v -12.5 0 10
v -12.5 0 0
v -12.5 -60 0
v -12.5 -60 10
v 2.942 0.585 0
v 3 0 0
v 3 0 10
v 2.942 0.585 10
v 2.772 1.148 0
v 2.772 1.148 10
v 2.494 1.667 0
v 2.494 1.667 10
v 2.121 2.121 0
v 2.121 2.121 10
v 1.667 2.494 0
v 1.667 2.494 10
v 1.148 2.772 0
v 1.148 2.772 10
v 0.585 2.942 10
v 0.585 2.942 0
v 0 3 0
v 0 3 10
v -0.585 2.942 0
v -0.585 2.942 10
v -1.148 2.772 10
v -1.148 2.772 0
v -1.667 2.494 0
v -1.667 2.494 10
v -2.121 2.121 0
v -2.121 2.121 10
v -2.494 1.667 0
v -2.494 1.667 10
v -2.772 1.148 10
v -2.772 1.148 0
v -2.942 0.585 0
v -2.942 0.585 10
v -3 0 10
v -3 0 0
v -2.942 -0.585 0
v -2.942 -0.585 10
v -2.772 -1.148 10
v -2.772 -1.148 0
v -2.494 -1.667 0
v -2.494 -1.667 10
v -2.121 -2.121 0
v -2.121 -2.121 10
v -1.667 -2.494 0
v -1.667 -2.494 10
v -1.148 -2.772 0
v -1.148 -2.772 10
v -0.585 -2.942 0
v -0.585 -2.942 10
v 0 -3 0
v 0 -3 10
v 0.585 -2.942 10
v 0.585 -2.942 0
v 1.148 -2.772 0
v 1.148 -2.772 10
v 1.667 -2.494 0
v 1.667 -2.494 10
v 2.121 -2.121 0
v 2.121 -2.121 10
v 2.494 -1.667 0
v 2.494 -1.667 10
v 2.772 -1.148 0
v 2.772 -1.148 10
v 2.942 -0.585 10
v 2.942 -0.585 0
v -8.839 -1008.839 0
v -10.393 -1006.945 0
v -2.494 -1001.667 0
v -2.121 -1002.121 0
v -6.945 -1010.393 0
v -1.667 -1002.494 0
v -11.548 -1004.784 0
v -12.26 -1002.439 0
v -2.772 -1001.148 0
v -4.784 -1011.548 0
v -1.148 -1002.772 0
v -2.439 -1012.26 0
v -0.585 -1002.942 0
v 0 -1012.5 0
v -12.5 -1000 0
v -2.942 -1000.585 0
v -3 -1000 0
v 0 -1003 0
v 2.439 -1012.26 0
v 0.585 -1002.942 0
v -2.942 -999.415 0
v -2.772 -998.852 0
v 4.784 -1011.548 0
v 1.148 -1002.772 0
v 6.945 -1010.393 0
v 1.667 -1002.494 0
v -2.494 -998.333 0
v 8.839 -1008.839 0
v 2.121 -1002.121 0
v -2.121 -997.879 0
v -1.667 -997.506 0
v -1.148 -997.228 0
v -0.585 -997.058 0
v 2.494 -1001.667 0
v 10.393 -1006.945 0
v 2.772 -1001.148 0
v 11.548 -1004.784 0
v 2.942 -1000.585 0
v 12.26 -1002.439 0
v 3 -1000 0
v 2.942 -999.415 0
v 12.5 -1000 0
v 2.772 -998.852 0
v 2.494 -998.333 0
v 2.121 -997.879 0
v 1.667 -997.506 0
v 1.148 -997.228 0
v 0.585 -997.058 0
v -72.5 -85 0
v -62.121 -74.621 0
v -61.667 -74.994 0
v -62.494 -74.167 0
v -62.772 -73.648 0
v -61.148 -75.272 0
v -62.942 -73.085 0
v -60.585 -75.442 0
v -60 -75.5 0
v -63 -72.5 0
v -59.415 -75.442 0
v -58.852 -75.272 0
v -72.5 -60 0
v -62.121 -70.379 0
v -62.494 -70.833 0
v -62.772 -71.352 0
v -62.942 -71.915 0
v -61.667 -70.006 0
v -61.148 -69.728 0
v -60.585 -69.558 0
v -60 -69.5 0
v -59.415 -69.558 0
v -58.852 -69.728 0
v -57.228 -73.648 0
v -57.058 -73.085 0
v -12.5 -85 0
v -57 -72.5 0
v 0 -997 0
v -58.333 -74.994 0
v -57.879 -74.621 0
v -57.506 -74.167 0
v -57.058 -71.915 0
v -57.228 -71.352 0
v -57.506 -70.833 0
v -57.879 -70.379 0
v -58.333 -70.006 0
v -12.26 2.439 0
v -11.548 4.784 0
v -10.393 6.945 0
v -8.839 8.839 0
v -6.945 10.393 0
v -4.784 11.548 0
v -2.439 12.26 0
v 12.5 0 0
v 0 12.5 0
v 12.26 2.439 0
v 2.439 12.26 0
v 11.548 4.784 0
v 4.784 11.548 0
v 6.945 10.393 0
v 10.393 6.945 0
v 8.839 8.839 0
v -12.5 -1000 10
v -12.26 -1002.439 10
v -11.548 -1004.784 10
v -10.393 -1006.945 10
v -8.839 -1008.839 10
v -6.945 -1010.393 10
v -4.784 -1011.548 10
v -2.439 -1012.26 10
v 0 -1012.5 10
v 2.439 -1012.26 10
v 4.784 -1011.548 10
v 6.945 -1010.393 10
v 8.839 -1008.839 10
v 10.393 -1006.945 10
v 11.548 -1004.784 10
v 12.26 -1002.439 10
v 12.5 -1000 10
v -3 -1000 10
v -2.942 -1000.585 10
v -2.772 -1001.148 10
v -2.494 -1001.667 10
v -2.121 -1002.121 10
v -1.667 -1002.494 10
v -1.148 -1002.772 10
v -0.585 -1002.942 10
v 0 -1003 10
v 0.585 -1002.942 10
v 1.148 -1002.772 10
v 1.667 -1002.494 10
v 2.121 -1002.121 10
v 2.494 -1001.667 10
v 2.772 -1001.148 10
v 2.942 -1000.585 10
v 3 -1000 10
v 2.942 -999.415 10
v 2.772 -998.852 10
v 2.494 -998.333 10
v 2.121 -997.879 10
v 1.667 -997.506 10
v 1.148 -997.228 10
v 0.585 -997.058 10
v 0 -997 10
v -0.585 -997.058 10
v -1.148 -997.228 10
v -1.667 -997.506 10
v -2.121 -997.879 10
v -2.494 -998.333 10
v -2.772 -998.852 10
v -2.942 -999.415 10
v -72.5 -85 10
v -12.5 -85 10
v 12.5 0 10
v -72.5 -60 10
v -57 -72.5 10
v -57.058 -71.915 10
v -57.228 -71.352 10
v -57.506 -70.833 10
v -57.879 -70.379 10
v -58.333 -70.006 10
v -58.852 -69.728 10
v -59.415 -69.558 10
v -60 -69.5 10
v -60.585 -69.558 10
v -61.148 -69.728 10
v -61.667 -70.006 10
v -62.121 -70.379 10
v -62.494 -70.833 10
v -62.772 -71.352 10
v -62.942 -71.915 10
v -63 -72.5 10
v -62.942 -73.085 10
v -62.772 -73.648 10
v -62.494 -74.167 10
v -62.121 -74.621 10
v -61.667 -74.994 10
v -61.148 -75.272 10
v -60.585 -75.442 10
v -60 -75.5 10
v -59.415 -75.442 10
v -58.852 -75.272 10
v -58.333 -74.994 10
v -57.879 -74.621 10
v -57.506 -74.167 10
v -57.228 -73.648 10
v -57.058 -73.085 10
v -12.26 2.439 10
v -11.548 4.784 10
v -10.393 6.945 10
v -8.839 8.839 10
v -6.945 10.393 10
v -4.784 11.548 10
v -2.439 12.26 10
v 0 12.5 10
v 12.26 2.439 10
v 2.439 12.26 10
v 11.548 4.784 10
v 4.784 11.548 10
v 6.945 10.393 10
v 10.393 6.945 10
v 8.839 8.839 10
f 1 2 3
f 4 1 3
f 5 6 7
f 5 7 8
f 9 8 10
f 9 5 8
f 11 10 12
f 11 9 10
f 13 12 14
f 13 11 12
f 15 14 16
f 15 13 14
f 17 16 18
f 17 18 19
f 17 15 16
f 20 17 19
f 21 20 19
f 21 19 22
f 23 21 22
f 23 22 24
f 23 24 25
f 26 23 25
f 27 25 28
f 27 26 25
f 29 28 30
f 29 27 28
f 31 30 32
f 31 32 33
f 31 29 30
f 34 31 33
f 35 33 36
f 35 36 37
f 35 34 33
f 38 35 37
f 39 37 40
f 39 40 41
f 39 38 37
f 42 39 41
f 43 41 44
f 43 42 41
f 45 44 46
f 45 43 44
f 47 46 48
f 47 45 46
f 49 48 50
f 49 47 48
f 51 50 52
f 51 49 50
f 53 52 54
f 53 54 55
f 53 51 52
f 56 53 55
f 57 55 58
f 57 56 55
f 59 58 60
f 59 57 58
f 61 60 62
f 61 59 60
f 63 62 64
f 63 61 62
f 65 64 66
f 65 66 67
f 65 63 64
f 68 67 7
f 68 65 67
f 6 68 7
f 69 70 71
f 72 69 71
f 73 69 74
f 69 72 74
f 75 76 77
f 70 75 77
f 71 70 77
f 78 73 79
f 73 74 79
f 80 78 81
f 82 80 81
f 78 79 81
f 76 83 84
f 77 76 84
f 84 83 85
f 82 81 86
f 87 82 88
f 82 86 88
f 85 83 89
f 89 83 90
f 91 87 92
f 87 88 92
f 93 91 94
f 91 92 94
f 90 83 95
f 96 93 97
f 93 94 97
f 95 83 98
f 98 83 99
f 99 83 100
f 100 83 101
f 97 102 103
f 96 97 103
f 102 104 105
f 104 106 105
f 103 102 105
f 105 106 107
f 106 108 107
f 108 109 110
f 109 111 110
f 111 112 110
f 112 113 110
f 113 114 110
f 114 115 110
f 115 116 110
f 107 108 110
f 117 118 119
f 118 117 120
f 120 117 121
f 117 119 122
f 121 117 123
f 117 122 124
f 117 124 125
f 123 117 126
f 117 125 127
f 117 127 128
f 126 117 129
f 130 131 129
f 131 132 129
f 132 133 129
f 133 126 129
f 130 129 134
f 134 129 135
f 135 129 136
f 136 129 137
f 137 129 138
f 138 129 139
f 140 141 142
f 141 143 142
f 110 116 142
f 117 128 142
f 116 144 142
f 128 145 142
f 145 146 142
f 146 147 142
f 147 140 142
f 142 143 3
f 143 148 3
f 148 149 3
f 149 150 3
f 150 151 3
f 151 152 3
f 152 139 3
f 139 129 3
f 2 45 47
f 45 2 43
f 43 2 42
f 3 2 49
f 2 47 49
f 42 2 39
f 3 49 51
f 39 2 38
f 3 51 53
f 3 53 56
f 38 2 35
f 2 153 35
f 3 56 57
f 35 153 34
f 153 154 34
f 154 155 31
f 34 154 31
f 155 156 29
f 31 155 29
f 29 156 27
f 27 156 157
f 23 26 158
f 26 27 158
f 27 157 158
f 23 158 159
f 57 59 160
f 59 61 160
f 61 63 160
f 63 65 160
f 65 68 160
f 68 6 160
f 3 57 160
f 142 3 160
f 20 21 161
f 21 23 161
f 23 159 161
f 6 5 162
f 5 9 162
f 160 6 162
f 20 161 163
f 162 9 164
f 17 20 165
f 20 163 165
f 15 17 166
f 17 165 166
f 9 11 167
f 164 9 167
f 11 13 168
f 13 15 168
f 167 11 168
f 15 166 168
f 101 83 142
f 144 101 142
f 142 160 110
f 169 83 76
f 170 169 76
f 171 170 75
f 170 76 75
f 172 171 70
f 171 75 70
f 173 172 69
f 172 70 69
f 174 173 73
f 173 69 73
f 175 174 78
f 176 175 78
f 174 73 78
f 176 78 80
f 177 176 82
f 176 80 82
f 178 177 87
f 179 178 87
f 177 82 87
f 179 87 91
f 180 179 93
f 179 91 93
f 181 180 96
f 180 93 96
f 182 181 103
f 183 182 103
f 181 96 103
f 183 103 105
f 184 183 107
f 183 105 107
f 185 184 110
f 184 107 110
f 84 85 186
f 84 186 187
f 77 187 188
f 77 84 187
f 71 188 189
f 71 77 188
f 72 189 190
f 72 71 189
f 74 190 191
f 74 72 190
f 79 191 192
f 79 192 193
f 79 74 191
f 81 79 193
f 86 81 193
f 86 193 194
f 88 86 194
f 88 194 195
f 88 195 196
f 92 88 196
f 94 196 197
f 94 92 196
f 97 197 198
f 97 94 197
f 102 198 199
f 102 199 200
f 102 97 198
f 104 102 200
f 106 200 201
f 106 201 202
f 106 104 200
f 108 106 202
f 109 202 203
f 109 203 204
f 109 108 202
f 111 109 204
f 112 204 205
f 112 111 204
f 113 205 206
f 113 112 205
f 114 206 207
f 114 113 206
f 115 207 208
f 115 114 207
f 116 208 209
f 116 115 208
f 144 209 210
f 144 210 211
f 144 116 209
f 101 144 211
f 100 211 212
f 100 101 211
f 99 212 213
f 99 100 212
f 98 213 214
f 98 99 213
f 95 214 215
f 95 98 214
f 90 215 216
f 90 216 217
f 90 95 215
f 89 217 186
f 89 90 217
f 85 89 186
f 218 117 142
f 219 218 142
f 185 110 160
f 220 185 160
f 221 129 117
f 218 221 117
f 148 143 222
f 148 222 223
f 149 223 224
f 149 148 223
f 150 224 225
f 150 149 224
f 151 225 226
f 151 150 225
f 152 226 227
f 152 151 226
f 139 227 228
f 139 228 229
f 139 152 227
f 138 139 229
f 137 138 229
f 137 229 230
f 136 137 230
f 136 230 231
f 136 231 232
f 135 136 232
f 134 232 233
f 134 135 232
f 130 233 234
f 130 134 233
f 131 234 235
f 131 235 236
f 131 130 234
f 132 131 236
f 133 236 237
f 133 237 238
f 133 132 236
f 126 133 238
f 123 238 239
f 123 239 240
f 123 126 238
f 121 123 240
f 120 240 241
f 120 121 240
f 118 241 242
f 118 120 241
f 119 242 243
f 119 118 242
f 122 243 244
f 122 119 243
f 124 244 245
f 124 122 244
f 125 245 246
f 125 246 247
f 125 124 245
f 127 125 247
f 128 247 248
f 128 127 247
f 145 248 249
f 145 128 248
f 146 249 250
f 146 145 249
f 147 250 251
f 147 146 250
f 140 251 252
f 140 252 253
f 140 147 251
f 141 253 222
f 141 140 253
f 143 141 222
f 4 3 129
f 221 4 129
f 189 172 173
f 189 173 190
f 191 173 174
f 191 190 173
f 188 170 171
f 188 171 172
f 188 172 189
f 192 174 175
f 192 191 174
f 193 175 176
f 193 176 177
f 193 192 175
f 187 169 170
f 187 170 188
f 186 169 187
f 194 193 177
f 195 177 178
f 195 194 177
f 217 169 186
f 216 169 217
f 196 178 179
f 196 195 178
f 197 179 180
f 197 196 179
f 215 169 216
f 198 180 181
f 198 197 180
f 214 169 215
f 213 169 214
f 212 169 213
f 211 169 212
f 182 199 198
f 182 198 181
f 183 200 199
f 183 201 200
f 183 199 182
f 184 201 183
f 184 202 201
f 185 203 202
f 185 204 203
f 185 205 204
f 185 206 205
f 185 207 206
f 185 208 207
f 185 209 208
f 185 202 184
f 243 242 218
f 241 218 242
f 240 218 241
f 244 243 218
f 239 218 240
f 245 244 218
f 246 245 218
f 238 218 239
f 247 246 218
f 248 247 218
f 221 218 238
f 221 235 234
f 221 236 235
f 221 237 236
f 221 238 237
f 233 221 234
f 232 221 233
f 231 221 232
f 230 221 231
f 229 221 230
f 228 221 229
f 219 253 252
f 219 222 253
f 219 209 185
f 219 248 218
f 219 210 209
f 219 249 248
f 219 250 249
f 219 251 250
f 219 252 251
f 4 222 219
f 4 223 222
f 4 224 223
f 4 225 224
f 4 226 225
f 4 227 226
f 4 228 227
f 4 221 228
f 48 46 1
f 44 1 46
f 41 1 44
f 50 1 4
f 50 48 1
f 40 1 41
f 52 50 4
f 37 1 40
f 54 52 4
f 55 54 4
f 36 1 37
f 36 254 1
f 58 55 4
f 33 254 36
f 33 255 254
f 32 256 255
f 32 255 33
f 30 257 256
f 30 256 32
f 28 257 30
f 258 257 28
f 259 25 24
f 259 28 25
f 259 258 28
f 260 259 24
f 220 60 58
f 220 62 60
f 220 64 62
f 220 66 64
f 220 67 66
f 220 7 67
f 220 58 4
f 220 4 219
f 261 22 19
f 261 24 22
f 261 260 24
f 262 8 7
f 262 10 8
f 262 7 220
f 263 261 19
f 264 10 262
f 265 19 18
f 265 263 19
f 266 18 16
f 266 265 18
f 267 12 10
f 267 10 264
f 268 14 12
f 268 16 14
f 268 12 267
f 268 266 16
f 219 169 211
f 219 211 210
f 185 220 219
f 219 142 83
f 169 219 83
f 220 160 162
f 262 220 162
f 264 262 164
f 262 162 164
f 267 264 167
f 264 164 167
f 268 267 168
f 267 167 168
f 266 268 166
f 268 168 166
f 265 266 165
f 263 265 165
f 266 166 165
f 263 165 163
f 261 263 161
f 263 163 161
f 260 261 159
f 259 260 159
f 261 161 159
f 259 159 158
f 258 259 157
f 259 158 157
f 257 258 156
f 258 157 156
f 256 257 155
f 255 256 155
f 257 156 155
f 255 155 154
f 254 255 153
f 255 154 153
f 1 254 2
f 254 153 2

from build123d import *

# Parameters (mm, degrees)
SKETCH1_R           = 3
BOSS_EXTRUDE1_DEPTH = 10


with BuildPart() as part:
    # Sketch1 → Boss-Extrude1 (new body)
    with BuildSketch(Plane.XY):
        with BuildLine():
            Line((-12.5, 0), (-12.5, -60))
            Line((-12.5, -60), (-72.5, -60))
            Line((-72.5, -60), (-72.5, -85))
            Line((-72.5, -85), (-12.5, -85))
            Line((-12.5, -85), (-12.5, -1000))
            ThreePointArc((-12.5, -1000), (0, -1012.5), (12.5, -1000))
            Line((12.5, -1000), (12.5, 0))
            ThreePointArc((12.5, 0), (0, 12.5), (-12.5, 0))
        make_face()
        Circle(SKETCH1_R, mode=Mode.SUBTRACT)
        with Locations(Location((0, -1000, 0), (0, 0, 180))):
            Circle(SKETCH1_R, mode=Mode.SUBTRACT)
        with Locations((-60, -72.5)):
            Circle(SKETCH1_R, mode=Mode.SUBTRACT)
    extrude(amount=BOSS_EXTRUDE1_DEPTH)


solid = part.part
